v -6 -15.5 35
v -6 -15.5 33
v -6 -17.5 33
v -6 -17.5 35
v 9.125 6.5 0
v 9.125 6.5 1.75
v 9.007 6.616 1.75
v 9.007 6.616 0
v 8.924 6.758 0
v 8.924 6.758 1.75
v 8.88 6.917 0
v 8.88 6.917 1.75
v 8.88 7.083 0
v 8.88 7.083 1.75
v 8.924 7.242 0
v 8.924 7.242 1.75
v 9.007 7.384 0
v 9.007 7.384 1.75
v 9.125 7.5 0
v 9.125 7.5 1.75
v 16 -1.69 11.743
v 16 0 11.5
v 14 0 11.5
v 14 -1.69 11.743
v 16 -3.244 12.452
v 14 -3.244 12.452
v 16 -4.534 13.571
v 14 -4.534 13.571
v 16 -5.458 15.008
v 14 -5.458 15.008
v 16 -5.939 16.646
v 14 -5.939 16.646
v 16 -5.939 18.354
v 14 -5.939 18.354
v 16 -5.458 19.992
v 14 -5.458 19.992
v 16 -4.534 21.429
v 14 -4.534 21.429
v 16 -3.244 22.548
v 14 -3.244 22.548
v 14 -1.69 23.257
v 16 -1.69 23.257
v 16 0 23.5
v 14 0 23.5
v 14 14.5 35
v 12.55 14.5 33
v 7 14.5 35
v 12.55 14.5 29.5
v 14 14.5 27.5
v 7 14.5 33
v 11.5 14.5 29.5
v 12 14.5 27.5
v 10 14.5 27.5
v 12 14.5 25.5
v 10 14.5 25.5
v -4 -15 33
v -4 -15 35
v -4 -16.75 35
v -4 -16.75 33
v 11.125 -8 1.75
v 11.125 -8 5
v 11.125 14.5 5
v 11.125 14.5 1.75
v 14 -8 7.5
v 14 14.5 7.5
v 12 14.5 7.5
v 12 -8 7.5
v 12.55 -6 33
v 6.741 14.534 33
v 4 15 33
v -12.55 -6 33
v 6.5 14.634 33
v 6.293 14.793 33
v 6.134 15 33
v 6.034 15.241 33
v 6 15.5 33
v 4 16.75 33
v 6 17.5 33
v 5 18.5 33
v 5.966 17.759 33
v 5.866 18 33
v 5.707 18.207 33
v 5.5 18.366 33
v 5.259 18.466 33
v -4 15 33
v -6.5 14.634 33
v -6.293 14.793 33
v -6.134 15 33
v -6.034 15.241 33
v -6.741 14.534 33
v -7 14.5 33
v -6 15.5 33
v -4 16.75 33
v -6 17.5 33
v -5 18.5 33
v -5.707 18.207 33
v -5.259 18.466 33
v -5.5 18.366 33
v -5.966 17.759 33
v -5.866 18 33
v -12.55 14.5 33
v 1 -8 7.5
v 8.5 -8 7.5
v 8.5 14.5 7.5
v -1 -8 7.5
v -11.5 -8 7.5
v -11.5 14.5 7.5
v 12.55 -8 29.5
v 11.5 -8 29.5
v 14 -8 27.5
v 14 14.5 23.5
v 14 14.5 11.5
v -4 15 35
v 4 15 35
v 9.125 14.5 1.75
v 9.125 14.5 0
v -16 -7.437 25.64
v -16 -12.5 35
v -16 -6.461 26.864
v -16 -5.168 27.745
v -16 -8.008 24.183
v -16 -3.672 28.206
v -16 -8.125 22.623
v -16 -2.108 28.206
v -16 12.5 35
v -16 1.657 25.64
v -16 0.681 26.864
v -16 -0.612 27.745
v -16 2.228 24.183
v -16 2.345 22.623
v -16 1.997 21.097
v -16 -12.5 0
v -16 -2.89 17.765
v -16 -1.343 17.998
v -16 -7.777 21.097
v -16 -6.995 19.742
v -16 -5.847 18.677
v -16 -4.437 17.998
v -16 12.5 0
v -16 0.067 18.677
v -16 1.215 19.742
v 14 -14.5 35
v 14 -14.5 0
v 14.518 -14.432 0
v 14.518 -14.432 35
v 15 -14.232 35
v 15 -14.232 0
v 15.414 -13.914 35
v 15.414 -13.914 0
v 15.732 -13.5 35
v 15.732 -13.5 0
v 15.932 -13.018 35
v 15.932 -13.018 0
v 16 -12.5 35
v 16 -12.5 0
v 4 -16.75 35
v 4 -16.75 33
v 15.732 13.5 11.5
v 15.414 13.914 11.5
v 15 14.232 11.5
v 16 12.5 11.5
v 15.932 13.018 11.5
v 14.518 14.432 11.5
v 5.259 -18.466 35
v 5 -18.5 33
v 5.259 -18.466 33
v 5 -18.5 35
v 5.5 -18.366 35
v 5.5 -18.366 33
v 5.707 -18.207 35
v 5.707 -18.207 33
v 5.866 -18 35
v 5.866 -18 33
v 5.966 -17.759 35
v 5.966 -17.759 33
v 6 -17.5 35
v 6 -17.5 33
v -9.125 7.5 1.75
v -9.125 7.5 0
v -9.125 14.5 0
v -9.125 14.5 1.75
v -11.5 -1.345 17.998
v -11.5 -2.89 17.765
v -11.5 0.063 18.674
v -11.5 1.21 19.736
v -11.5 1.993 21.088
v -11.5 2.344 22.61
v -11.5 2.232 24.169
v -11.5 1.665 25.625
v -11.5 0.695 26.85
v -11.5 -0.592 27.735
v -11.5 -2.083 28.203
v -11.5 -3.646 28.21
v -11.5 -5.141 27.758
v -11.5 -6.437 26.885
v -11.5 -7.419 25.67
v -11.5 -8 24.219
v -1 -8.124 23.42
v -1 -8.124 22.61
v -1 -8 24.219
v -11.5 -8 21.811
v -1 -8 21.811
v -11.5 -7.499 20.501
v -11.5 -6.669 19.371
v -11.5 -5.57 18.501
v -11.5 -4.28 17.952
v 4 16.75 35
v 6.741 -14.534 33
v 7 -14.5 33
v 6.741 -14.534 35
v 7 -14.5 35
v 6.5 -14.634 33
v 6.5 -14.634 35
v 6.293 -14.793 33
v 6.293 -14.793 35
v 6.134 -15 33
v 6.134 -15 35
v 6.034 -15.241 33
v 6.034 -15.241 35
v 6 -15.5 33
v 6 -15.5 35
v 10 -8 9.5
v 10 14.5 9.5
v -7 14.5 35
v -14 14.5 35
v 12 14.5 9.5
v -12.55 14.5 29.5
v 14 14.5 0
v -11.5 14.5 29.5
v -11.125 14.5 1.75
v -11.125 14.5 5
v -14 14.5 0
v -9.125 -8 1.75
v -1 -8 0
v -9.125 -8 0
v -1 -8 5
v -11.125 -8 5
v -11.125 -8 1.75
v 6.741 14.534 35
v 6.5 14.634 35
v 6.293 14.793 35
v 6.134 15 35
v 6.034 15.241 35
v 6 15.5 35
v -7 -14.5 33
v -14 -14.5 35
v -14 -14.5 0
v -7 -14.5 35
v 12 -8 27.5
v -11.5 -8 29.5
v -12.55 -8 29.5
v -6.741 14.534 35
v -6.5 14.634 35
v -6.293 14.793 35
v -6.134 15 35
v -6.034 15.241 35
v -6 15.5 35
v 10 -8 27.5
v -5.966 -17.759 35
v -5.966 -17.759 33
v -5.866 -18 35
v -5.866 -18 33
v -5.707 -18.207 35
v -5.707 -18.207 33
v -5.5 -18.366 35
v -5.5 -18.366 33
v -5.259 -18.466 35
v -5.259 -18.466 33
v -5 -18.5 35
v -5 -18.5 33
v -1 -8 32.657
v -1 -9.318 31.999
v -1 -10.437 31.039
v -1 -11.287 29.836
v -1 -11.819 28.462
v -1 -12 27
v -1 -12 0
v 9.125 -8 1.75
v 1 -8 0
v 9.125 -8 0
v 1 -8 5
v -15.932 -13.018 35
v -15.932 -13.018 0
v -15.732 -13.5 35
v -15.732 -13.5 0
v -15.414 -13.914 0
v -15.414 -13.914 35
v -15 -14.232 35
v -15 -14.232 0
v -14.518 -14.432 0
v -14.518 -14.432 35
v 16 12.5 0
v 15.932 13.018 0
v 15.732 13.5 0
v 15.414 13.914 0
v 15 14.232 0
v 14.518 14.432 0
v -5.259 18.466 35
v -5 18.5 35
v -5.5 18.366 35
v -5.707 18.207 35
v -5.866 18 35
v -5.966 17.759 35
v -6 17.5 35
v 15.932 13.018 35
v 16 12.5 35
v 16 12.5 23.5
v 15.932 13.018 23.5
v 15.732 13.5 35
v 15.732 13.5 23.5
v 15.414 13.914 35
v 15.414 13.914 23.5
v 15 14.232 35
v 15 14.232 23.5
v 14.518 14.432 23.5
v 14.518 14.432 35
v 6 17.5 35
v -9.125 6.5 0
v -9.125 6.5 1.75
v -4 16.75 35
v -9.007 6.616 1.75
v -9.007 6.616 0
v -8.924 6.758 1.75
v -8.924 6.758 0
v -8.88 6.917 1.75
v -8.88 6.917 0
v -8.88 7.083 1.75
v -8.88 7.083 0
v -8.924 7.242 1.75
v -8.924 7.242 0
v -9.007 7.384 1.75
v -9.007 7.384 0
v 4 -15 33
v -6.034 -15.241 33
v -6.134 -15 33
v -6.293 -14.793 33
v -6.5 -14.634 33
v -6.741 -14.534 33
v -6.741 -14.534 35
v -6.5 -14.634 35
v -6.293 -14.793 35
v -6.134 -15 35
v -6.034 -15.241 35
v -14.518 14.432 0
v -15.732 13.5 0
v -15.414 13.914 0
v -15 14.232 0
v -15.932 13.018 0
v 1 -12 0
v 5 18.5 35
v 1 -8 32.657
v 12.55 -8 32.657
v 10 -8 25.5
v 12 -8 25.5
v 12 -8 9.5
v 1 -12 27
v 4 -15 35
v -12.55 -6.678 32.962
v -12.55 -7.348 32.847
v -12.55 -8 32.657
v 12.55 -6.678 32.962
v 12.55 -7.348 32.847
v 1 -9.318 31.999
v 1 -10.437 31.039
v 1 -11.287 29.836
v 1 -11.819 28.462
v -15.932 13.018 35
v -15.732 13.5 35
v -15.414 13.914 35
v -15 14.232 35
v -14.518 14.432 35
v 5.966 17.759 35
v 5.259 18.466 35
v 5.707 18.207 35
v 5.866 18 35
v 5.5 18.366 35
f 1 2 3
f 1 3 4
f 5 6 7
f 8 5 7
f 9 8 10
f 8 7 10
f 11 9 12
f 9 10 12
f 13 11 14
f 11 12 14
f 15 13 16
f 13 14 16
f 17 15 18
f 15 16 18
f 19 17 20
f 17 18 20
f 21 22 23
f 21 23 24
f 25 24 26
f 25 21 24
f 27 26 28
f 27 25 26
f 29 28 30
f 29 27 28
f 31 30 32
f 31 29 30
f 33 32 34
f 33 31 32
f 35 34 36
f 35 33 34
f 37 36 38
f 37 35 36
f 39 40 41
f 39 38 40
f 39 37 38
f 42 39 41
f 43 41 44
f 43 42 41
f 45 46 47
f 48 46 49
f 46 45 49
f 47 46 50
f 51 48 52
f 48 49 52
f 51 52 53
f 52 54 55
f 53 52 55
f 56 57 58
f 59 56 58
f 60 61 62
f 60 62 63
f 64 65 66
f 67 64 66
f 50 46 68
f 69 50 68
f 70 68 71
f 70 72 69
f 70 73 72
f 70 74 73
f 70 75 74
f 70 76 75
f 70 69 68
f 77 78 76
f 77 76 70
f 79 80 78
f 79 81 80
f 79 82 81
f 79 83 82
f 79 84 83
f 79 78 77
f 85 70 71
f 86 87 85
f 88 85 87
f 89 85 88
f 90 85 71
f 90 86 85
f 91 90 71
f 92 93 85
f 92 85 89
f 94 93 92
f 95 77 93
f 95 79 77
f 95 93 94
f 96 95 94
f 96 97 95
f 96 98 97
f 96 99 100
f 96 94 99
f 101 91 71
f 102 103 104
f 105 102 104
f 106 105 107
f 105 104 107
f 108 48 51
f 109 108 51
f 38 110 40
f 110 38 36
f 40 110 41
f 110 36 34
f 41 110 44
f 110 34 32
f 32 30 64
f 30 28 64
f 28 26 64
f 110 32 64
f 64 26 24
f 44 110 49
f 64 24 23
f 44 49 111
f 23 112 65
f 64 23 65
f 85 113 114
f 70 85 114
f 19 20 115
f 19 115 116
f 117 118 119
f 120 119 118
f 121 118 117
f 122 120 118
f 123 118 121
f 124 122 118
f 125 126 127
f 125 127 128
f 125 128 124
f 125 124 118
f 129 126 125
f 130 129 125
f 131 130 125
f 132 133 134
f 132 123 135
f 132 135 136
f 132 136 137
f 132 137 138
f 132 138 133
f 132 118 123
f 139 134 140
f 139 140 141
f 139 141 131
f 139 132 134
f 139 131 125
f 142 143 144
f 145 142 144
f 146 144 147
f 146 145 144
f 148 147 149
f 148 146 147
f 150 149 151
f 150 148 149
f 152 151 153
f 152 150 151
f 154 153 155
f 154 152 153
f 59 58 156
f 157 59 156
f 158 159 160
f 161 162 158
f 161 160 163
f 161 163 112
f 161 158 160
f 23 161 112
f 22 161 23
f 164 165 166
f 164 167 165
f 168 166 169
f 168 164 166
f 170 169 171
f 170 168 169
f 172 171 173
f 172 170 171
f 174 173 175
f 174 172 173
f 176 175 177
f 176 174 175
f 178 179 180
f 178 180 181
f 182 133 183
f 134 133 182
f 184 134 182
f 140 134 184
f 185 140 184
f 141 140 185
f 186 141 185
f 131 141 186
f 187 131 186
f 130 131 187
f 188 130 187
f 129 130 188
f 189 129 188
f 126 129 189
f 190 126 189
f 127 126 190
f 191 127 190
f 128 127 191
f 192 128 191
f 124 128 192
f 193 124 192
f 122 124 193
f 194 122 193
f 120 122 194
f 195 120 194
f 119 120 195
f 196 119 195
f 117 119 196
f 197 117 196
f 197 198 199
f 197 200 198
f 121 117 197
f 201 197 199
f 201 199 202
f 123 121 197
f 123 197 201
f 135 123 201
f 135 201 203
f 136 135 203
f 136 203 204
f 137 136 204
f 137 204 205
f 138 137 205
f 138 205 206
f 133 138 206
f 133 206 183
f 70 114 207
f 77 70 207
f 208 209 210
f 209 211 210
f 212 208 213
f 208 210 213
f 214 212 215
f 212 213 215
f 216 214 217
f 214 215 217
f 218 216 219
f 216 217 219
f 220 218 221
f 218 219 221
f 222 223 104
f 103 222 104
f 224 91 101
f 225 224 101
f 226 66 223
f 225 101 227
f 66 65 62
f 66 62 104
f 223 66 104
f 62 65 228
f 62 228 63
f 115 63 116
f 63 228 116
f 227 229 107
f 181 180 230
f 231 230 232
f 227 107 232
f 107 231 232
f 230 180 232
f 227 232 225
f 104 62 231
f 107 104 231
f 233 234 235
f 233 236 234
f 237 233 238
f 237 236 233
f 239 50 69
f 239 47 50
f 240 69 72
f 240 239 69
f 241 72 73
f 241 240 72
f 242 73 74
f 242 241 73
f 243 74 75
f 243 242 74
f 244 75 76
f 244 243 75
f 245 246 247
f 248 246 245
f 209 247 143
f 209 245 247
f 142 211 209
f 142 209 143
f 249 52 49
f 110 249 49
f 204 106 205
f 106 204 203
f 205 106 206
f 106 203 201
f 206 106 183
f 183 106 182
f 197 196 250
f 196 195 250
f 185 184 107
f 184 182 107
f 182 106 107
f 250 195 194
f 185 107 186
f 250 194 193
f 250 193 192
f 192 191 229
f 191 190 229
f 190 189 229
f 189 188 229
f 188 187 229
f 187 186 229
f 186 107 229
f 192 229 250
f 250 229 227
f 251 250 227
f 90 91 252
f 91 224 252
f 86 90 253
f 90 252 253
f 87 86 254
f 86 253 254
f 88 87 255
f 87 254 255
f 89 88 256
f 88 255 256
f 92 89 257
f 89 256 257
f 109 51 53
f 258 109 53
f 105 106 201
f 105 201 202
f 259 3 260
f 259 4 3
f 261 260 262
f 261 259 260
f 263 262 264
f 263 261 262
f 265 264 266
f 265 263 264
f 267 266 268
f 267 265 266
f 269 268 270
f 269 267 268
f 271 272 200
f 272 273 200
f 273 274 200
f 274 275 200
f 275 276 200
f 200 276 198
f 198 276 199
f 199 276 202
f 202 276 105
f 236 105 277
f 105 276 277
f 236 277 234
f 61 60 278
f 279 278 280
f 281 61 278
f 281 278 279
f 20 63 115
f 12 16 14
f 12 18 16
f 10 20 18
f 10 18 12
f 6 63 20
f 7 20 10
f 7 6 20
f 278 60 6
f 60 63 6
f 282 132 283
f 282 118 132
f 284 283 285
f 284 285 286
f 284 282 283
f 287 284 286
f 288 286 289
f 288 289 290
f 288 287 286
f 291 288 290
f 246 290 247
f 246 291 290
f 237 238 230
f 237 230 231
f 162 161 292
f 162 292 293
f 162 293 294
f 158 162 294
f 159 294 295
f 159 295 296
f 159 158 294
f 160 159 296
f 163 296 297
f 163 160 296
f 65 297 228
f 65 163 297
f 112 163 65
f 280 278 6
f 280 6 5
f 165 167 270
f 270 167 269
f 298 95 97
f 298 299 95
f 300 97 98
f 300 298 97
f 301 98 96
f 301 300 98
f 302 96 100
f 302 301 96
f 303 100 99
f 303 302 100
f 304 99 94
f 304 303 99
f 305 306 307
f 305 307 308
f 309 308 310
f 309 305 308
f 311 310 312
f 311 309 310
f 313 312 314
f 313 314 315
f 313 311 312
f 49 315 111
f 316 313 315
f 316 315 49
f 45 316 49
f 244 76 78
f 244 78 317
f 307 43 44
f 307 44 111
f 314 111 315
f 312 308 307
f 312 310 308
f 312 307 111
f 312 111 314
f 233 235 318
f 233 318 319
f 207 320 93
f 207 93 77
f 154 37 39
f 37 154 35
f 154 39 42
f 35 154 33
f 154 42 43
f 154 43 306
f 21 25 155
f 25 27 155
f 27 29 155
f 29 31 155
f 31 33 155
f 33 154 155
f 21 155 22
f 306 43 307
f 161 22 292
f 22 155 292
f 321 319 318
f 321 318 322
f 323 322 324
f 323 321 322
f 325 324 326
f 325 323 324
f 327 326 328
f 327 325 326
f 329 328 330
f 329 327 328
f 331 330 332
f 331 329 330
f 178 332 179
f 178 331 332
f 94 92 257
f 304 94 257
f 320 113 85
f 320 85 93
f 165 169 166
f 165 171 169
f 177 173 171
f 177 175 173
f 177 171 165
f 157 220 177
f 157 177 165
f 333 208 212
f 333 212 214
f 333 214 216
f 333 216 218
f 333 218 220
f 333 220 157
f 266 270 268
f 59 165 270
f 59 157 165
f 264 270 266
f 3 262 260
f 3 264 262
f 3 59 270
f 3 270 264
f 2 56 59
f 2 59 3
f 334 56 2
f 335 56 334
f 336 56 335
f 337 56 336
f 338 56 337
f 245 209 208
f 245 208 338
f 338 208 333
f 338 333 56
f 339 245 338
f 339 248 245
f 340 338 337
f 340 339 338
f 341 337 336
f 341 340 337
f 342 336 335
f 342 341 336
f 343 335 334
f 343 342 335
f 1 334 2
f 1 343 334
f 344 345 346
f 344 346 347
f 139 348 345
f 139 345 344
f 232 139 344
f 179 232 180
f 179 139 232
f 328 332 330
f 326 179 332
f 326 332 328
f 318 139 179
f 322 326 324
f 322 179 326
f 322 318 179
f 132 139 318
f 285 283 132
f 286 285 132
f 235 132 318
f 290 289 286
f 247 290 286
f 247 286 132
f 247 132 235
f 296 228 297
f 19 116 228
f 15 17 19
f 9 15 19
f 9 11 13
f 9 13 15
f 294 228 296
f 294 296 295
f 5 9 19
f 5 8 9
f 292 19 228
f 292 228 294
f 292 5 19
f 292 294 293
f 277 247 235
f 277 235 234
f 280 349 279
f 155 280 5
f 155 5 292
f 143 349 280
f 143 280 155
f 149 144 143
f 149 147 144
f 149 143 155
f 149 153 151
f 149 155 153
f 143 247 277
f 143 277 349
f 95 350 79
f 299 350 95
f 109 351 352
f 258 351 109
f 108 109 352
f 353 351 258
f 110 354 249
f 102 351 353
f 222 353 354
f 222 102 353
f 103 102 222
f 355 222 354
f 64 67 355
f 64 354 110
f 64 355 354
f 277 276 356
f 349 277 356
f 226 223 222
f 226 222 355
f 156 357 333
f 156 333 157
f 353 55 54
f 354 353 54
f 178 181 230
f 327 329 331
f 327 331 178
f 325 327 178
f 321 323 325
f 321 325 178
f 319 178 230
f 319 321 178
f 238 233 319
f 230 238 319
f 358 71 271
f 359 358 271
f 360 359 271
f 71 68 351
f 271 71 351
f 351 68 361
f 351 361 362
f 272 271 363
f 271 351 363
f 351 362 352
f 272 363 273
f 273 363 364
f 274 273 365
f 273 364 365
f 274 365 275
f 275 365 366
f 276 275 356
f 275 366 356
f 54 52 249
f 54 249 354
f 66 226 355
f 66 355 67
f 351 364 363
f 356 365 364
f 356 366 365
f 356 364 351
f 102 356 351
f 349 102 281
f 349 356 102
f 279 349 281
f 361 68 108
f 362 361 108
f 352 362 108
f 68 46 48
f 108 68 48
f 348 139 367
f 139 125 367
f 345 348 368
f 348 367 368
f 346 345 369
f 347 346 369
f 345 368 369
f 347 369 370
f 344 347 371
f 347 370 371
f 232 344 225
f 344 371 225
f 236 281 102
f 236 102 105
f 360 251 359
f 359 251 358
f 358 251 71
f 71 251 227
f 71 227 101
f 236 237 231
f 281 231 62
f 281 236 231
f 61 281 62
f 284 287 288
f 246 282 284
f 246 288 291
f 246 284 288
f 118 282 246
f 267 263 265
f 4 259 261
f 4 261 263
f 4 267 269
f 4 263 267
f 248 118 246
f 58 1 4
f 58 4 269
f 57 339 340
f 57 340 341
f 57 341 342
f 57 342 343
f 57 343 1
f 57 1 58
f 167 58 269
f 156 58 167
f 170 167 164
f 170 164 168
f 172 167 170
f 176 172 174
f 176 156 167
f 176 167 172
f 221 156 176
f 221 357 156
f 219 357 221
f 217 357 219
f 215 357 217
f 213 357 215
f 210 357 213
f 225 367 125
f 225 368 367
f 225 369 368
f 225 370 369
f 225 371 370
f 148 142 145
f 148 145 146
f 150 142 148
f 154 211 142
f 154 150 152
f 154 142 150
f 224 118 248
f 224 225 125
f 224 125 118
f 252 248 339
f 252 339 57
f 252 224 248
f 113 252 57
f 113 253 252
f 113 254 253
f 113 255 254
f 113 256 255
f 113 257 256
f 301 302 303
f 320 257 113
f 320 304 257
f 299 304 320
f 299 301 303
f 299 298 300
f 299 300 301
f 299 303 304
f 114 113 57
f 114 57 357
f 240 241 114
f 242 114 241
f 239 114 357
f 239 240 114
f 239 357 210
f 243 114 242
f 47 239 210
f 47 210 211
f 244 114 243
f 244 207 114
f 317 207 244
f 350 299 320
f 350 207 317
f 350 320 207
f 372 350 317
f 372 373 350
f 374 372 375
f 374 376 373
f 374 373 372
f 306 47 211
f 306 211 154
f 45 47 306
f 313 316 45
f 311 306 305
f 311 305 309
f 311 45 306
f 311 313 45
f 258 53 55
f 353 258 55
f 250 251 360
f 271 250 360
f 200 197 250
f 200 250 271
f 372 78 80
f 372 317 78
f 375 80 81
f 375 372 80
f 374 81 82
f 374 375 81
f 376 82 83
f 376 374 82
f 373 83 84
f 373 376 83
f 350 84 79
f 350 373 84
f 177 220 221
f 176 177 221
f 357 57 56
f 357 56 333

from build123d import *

# Parameters (mm, degrees)
SKETCH1_W                         = 32
SKETCH1_H                         = 29
BOSS_EXTRUDE1_DEPTH               = 35
FILLET1_R                         = 2
SLOT_FOR_COIL_DEPTH               = 1
SLOT_FOR_COIL_DEPTH_BACK          = 30
BOSS_EXTRUDE2_DEPTH               = 6.5
BOSS_EXTRUDE3_DEPTH               = 1.75
SKETCH5_W                         = 2
SKETCH5_H                         = 6.5
SLOT_TO_FEED_IN_WIRE_DEPTH        = 33
SLOT_FO_PCB_DEPTH                 = 22.5
SKETCH7_W                         = 2
SKETCH7_H                         = 33
BOSS_EXTRUDE4_DEPTH               = 2.5
FILLET2_R                         = 6
ROD_MOUNT_SLOT_REACH              = 34
SKETCH14_W                        = 2.5
SKETCH14_H                        = 20
SIDE_CAVITY_FOR_MOUNT_PLATE_DEPTH = 22.5
SKETCH16_W                        = 2
SKETCH16_H                        = 2
SIDE_STOPS_FOR_MOUNT_PLATE_DEPTH  = 22.5
BOSS_EXTRUDE6_DEPTH               = 22.5
SKETCH21_W                        = 12
SKETCH21_H                        = 2
BOSS_EXTRUDE7_DEPTH               = 4
SKETCH23_W                        = 8
SKETCH23_H                        = 1.75
CUT_EXTRUDE7_DEPTH                = 2
FILLET3_R                         = 1
CUT_EXTRUDE8_REACH                = 34
SKETCH26_R                        = 5.25


with BuildPart() as part:
    # Sketch1 → Boss-Extrude1 (new body)
    with BuildSketch(Plane.XY):
        Rectangle(SKETCH1_W, SKETCH1_H)
    extrude(amount=BOSS_EXTRUDE1_DEPTH)

    # Fillet1
    fillet1_edges = [part.edges().sort_by_distance(p)[0] for p in [
        (16, -14.5, 17.5),
        (-16, -14.5, 17.5),
        (-16, 14.5, 17.5),
        (16, 14.5, 17.5),
    ]]
    fillet(fillet1_edges, radius=FILLET1_R)

    # Sketch2 → Slot for Coil (cut, two sides)
    with BuildSketch(Plane.XZ.offset(14.5)) as slot_for_coil_sk:
        Polygon((-9.125, 0), (-9.125, 1.75), (-11.125, 1.75), (-11.125, 5), (11.125, 5), (11.125, 1.75), (9.125, 1.75), (9.125, 0), align=None)
    extrude(amount=SLOT_FOR_COIL_DEPTH, mode=Mode.SUBTRACT)
    extrude(slot_for_coil_sk.sketch, amount=-SLOT_FOR_COIL_DEPTH_BACK, mode=Mode.SUBTRACT)

    # Sketch3 → Boss-Extrude2 (add)
    with BuildSketch(Plane.XZ.offset(14.5)):
        Polygon((-9.125, 0), (-9.125, 1.75), (-11.125, 1.75), (-11.125, 5), (11.125, 5), (11.125, 1.75), (9.125, 1.75), (9.125, 0), align=None)
    extrude(amount=-BOSS_EXTRUDE2_DEPTH)

    # Sketch4 → Boss-Extrude3 (add)
    with BuildSketch(Plane(origin=(0, 0, 1.75), x_dir=(-1, 0, 0), z_dir=(0, 0, -1))):
        with BuildLine():
            Line((-9.125, 7.5), (-9.125, 6.5))
            ThreePointArc((-9.125, 6.5), (-8.875, 7), (-9.125, 7.5))
        make_face()
    boss_extrude3 = extrude(amount=BOSS_EXTRUDE3_DEPTH)

    # Mirror1: Boss-Extrude3 across plane
    add(boss_extrude3.mirror(Plane(origin=(0, 0, 0), x_dir=(0, 0, 1), z_dir=(1, 0, 0))))

    # Sketch5 → slot to feed in wire (cut)
    with BuildSketch(Plane(origin=(0, 0, 0), x_dir=(-1, 0, 0), z_dir=(0, 0, -1))):
        with Locations((0, -11.25)):
            Rectangle(SKETCH5_W, SKETCH5_H)
    extrude(amount=-SLOT_TO_FEED_IN_WIRE_DEPTH, mode=Mode.SUBTRACT)

    # Sketch6 → slot fo PCB (cut)
    with BuildSketch(Plane(origin=(0, 14.5, 0), x_dir=(1, 0, 0), z_dir=(0, 1, 0))):
        Polygon((11.5, -7.5), (-11.5, -7.5), (-11.5, -29.5), (-12.55, -29.5), (-12.55, -33), (12.55, -33), (12.55, -29.5), (11.5, -29.5), align=None)
    extrude(amount=-SLOT_FO_PCB_DEPTH, mode=Mode.SUBTRACT)

    # Sketch7 → Boss-Extrude4 (add)
    with BuildSketch(Plane.XZ.offset(14.5)):
        with Locations((0, 16.5)):
            Rectangle(SKETCH7_W, SKETCH7_H)
    extrude(amount=-BOSS_EXTRUDE4_DEPTH)

    # Fillet2
    fillet2_edges = [part.edges().sort_by_distance(p)[0] for p in [
        (0, -12, 33),
    ]]
    fillet(fillet2_edges, radius=FILLET2_R)

    # Sketch11 → Rod Mount Slot (cut, up to next)
    with BuildSketch(Plane(origin=(16, 0, 44), x_dir=(0, 0, -1), z_dir=(1, 0, 0)), mode=Mode.PRIVATE) as rod_mount_slot_sk1:
        with BuildLine():
            Line((32.5, 25), (32.5, 0))
            ThreePointArc((32.5, 0), (26.5, -6), (20.5, 0))
            Line((20.5, 0), (20.5, 25))
            ThreePointArc((20.5, 25), (26.5, 31), (32.5, 25))
        make_face()
    rod_mount_slot_tool1 = extrude(rod_mount_slot_sk1.sketch, amount=-ROD_MOUNT_SLOT_REACH, mode=Mode.PRIVATE) & part.part
    add(rod_mount_slot_tool1.solids().sort_by_distance((16, 12.5, 17.5))[0], mode=Mode.SUBTRACT)

    # Sketch14 → Side cavity for mount plate (cut)
    with BuildSketch(Plane(origin=(0, 14.5, 0), x_dir=(1, 0, 0), z_dir=(0, 1, 0))):
        with Locations((12.75, -17.5)):
            Rectangle(SKETCH14_W, SKETCH14_H)
    extrude(amount=-SIDE_CAVITY_FOR_MOUNT_PLATE_DEPTH, mode=Mode.SUBTRACT)

    # Sketch16 → Side stops for mount plate (add)
    with BuildSketch(Plane(origin=(0, 14.5, 0), x_dir=(1, 0, 0), z_dir=(0, 1, 0))):
        with Locations((11, -8.5)):
            Rectangle(SKETCH16_W, SKETCH16_H)
        with Locations((11, -26.5)):
            Rectangle(SKETCH16_W, SKETCH16_H)
    extrude(amount=-SIDE_STOPS_FOR_MOUNT_PLATE_DEPTH)

    # Sketch20 → Boss-Extrude6 (add)
    with BuildSketch(Plane(origin=(0, 14.5, 0), x_dir=(1, 0, 0), z_dir=(0, 1, 0))):
        Polygon((11.5, -29.5), (10, -27.5), (11.5, -27.5), align=None)
        Polygon((10, -9.5), (8.5, -7.5), (10, -7.5), align=None)
    extrude(amount=-BOSS_EXTRUDE6_DEPTH)

    # Sketch21 → Boss-Extrude7 (add)
    with BuildSketch(Plane(origin=(0, 14.5, 0), x_dir=(-1, 0, 0), z_dir=(0, 1, 0))):
        with Locations((0, 34)):
            Rectangle(SKETCH21_W, SKETCH21_H)
    boss_extrude7 = extrude(amount=BOSS_EXTRUDE7_DEPTH)

    # Sketch23 → Cut-Extrude7 (cut)
    with BuildSketch(Plane.XY.offset(35)):
        with Locations((0, 15.875)):
            Rectangle(SKETCH23_W, SKETCH23_H)
    cut_extrude7 = extrude(amount=-CUT_EXTRUDE7_DEPTH, mode=Mode.SUBTRACT)

    # Mirror3: Boss-Extrude7, Cut-Extrude7 across plane
    add(boss_extrude7.mirror(Plane.ZX))
    add(cut_extrude7.mirror(Plane.ZX), mode=Mode.SUBTRACT)

    # Fillet3
    fillet3_edges = [part.edges().sort_by_distance(p)[0] for p in [
        (6, 14.5, 34),
        (-6, 14.5, 34),
        (6, 18.5, 34),
        (-6, 18.5, 34),
        (6, -18.5, 34),
        (-6, -18.5, 34),
        (6, -14.5, 34),
        (-6, -14.5, 34),
    ]]
    fillet(fillet3_edges, radius=FILLET3_R)

    # Sketch26 → Cut-Extrude8 (cut, up to next)
    with BuildSketch(Plane(origin=(-16, 0, 0), x_dir=(0, 0, -1), z_dir=(1, 0, 0)), mode=Mode.PRIVATE) as cut_extrude8_sk1:
        with Locations((-23.015, -2.89)):
            Circle(SKETCH26_R)
    cut_extrude8_tool1 = extrude(cut_extrude8_sk1.sketch, amount=CUT_EXTRUDE8_REACH, mode=Mode.PRIVATE) & part.part
    add(cut_extrude8_tool1.solids().sort_by_distance((-16, -2.89, 23.015))[0], mode=Mode.SUBTRACT)


solid = part.part
